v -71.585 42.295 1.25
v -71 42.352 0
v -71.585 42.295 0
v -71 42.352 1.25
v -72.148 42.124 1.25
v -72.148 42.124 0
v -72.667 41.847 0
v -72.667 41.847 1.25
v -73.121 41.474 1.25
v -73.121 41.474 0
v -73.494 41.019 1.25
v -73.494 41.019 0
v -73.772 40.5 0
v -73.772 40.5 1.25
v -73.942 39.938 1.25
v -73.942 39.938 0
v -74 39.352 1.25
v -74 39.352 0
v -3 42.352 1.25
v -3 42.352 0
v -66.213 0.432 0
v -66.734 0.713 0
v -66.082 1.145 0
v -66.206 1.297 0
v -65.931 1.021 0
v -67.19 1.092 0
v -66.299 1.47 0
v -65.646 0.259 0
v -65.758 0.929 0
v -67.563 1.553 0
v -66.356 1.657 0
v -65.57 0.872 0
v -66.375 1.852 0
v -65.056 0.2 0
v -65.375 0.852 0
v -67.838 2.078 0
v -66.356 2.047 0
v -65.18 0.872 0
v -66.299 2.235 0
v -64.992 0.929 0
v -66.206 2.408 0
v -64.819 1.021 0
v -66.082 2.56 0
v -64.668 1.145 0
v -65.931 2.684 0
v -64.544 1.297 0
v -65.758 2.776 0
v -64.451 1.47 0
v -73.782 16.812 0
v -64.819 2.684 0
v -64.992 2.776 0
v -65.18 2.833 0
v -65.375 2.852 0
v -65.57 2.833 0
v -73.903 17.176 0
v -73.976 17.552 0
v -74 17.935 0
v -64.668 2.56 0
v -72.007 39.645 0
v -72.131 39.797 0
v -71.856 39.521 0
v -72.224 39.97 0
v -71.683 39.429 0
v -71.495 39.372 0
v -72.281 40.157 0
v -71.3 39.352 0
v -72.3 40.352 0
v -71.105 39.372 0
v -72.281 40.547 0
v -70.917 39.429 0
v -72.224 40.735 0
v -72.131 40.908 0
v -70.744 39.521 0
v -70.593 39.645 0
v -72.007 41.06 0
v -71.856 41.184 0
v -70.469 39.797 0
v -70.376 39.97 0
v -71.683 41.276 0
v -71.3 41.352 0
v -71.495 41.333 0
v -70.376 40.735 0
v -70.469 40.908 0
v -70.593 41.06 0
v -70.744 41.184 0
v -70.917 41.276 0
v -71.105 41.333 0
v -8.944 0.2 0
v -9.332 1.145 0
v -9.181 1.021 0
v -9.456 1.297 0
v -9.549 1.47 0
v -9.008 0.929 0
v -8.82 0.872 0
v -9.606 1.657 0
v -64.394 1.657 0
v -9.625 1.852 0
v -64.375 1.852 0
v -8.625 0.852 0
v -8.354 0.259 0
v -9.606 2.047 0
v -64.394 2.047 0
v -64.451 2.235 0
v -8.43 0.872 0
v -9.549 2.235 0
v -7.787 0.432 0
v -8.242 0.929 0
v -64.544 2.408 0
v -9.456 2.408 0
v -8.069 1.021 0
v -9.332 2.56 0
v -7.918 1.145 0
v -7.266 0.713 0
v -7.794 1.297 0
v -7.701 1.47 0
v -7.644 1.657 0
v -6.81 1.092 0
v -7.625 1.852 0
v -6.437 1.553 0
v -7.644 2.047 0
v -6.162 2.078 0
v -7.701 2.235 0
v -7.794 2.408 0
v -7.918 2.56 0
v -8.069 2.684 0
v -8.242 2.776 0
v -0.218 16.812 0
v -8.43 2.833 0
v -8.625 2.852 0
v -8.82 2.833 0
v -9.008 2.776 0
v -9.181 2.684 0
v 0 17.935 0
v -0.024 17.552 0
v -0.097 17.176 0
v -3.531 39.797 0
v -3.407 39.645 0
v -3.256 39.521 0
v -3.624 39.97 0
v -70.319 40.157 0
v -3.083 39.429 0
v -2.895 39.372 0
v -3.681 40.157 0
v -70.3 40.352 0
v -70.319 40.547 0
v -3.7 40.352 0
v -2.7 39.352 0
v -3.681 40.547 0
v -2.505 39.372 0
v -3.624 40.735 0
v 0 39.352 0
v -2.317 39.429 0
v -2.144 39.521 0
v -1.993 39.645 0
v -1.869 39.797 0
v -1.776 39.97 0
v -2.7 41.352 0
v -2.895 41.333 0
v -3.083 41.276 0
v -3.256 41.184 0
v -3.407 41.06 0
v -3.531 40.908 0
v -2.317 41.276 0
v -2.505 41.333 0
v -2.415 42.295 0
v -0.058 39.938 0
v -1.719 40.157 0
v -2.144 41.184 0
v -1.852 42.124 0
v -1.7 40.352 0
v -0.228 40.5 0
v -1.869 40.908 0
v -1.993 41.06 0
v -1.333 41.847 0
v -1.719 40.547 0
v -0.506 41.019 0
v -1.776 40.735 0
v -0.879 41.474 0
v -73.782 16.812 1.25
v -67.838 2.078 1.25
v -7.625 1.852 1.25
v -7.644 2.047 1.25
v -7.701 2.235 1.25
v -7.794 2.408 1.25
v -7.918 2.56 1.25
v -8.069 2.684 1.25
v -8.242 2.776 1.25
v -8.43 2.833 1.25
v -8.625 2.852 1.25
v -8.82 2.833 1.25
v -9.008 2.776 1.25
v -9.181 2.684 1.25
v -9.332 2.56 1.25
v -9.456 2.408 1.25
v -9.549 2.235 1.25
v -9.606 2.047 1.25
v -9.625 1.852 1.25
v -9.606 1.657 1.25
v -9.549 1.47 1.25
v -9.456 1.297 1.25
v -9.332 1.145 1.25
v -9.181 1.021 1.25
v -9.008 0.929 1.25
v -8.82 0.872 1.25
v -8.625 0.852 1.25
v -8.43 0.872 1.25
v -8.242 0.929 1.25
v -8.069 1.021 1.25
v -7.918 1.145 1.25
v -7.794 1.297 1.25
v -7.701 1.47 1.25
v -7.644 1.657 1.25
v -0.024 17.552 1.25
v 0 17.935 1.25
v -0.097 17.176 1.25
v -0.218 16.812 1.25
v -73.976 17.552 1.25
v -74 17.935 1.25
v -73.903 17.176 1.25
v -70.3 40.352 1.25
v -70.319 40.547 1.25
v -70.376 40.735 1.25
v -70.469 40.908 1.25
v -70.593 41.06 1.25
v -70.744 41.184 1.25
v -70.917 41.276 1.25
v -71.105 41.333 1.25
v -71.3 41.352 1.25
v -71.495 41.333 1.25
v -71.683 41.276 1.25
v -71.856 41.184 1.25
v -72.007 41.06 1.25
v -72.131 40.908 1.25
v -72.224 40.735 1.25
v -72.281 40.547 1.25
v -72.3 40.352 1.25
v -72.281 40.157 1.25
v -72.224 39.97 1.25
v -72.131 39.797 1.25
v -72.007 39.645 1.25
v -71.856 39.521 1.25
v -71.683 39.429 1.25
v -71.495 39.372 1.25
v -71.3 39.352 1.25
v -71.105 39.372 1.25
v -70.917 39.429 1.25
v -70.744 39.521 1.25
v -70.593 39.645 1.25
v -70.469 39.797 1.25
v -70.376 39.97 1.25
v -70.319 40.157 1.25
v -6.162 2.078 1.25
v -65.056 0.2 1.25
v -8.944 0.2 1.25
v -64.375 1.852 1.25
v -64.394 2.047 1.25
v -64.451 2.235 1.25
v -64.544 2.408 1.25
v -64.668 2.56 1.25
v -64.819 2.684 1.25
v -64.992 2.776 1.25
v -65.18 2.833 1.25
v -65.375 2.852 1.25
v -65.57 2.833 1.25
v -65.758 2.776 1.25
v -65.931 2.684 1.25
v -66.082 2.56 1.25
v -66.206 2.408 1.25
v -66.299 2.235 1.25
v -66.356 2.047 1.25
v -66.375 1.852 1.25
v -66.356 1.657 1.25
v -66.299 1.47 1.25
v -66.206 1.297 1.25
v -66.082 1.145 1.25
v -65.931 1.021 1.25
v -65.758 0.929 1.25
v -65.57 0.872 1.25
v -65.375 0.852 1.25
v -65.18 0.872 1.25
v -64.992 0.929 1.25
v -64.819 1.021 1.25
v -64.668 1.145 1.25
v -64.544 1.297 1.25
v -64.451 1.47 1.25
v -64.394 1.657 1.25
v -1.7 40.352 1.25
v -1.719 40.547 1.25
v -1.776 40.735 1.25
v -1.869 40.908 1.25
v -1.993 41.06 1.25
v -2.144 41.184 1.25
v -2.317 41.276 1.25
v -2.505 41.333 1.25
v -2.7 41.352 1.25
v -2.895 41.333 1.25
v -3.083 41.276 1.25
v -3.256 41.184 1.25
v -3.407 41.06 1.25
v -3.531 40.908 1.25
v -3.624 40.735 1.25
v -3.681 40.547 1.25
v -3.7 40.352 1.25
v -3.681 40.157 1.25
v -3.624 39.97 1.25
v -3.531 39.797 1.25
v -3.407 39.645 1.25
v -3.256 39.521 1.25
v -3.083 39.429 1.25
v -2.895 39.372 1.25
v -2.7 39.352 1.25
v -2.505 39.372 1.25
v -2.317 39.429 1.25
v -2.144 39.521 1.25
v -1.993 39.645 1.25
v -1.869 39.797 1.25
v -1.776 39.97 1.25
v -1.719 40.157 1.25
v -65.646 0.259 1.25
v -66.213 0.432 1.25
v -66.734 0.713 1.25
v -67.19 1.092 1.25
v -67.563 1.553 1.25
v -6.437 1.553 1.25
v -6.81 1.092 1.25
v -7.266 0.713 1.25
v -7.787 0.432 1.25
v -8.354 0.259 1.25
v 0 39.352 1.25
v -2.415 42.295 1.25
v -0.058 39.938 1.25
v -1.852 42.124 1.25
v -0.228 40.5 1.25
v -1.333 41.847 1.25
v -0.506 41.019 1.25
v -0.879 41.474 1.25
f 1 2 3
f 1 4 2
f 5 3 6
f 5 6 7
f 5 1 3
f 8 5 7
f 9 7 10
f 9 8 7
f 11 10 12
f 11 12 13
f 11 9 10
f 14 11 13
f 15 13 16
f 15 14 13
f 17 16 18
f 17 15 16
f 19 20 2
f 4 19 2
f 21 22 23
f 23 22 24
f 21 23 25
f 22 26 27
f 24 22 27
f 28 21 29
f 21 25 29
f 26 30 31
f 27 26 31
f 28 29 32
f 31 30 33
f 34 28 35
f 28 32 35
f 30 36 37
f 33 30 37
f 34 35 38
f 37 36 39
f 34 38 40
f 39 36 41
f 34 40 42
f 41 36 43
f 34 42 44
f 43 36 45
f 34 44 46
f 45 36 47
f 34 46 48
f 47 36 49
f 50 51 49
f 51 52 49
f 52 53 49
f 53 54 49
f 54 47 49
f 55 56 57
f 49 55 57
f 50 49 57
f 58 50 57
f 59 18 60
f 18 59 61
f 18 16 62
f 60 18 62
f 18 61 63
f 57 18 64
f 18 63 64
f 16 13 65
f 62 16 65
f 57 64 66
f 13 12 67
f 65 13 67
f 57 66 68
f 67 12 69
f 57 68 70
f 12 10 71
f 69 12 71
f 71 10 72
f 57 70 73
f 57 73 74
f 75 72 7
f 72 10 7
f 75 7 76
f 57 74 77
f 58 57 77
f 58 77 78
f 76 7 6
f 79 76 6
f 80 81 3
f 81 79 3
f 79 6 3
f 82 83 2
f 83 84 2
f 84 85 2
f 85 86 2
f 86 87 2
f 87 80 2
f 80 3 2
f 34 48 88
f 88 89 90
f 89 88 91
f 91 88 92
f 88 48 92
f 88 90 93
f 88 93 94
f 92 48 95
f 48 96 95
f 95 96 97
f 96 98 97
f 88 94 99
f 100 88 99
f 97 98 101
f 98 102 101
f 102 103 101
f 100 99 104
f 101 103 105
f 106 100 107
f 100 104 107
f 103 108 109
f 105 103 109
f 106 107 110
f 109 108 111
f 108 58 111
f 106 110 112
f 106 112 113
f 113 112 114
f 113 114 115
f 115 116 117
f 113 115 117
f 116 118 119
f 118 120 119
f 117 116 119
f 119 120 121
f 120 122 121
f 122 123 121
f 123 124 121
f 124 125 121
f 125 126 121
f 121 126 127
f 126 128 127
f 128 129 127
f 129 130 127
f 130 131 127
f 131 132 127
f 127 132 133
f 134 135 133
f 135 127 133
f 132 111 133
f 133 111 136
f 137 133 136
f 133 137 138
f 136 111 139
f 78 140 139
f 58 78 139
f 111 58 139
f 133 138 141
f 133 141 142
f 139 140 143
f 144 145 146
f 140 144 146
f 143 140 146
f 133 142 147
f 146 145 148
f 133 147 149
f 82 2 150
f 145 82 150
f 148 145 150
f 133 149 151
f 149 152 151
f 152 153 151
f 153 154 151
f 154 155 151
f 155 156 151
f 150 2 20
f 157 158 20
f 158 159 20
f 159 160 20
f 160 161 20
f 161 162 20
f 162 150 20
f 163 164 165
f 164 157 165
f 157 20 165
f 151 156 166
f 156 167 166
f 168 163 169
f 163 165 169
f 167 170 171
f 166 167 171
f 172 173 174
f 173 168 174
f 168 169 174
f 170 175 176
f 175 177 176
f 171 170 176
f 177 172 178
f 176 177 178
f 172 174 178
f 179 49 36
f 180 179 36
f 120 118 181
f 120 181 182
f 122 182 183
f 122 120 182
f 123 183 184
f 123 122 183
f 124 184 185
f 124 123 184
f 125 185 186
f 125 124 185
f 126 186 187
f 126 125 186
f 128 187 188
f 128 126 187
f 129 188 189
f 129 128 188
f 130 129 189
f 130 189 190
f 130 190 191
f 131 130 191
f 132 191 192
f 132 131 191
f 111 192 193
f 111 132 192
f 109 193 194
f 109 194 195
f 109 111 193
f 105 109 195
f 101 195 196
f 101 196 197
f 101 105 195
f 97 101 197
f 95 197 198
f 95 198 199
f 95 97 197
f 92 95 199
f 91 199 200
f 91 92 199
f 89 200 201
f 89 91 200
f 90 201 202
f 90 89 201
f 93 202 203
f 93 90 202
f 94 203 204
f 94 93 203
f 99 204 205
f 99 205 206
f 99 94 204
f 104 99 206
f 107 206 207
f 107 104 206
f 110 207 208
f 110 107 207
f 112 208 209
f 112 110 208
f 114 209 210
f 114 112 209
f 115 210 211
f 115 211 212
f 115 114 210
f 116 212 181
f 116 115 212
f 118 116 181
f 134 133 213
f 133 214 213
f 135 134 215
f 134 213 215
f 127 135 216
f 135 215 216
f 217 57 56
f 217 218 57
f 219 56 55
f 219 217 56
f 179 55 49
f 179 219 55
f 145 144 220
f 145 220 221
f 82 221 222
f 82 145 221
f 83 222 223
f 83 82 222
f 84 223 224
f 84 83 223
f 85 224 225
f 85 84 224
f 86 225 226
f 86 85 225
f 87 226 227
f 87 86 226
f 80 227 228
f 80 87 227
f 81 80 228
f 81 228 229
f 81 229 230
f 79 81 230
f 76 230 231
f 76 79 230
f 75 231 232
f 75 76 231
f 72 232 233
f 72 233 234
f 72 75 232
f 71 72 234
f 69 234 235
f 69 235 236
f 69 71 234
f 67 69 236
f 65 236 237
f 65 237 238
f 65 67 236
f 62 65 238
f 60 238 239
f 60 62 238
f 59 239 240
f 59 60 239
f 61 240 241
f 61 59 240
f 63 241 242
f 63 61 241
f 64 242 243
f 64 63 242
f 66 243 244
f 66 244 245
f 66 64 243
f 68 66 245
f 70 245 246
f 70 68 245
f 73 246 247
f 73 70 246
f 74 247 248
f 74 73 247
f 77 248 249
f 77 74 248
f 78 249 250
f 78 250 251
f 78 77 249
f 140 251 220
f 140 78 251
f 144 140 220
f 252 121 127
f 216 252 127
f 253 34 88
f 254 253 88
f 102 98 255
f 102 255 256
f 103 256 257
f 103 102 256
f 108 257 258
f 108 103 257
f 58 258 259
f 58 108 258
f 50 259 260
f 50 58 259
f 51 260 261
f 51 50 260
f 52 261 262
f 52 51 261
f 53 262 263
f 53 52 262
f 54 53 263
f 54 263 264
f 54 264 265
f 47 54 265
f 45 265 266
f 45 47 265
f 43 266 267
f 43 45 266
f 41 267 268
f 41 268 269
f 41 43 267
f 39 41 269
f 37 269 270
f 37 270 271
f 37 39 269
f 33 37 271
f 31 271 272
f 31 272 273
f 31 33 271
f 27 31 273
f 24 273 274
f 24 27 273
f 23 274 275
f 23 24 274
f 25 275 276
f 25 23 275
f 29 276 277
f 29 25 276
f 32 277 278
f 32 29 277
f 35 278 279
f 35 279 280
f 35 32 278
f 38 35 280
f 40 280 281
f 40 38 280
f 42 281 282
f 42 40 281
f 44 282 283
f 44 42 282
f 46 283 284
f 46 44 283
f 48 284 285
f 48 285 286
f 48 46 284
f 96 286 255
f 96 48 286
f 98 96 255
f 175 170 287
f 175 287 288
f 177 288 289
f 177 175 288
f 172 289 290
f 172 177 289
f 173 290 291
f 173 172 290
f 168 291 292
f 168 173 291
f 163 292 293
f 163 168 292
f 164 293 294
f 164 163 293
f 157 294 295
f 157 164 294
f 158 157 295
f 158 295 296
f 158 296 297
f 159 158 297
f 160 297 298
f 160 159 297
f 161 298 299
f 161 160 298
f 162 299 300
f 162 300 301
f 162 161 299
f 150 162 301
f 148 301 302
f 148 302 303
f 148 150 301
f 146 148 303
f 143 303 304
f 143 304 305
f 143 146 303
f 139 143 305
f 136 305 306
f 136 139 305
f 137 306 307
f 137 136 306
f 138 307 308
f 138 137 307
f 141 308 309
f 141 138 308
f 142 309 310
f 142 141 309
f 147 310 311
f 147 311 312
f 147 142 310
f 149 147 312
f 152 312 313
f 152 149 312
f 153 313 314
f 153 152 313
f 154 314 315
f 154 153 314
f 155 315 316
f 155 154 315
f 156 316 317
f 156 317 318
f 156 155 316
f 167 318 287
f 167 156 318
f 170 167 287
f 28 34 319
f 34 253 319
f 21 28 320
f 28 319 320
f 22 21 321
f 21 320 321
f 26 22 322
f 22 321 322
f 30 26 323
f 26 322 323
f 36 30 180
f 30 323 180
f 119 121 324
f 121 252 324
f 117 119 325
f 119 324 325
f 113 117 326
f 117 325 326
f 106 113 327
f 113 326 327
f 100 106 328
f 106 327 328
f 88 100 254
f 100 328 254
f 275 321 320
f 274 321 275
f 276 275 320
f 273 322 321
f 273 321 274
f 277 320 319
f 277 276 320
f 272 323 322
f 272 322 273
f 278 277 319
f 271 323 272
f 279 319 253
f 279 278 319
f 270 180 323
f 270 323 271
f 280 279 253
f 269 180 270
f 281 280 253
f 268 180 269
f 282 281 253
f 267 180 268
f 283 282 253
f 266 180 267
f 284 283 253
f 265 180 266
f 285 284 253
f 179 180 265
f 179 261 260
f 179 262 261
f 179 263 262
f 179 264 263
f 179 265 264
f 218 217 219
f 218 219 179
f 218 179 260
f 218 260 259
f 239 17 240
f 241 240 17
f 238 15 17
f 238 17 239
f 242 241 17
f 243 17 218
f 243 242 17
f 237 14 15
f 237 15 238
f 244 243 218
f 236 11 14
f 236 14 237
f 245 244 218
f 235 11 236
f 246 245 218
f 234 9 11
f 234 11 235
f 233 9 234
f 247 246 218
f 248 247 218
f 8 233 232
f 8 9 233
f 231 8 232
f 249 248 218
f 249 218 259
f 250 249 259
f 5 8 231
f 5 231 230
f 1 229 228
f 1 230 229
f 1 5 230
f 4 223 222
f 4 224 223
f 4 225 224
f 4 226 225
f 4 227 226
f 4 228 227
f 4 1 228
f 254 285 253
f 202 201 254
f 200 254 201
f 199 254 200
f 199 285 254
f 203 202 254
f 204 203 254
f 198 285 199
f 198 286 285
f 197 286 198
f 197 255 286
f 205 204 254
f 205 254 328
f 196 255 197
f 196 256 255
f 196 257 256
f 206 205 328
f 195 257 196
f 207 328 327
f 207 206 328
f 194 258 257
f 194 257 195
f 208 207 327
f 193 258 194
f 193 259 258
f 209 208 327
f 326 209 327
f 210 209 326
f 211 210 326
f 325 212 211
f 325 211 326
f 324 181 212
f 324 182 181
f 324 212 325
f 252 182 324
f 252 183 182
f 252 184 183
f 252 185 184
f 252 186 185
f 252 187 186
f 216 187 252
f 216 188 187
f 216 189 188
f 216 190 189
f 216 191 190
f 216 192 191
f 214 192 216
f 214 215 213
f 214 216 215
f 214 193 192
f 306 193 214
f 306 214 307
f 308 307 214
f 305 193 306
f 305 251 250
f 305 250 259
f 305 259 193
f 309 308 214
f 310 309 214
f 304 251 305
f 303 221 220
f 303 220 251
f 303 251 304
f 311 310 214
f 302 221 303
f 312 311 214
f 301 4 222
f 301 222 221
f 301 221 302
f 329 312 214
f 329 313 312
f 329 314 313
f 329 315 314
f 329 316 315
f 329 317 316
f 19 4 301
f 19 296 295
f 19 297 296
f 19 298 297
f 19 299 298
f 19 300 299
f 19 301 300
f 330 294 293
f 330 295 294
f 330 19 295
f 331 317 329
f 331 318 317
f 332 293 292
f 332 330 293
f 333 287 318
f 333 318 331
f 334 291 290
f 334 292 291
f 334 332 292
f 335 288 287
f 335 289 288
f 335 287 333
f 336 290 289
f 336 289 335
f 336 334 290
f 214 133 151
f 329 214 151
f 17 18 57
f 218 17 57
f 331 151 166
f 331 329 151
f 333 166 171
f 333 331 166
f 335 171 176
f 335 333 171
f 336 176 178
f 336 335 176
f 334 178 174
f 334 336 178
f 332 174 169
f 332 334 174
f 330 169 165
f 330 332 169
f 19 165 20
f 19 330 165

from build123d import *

# Parameters (mm, degrees)
F0_R     = 1
F1_DEPTH = 1.25
F2_R     = 3


with BuildPart() as f1:
    # F0 (on Top) → F1 (new body)
    with BuildSketch(Plane.XY):
        Polygon((0, 17.3524001093), (0, 42.3524001093), (-74, 42.3524001093), (-74, 17.3524001093), (-67.080681713, 0.2000030523), (-6.919318287, 0.2000030523), align=None)
        with Locations((-65.375, 1.8524001093)):
            Circle(F0_R, mode=Mode.SUBTRACT)
        with Locations((-8.625, 1.8524001093)):
            Circle(F0_R, mode=Mode.SUBTRACT)
        with Locations((-71.3, 40.3524001093)):
            Circle(F0_R, mode=Mode.SUBTRACT)
        with Locations((-2.7, 40.3524001093)):
            Circle(F0_R, mode=Mode.SUBTRACT)
    extrude(amount=F1_DEPTH)

    # F2
    f2_edges = [f1.edges().sort_by_distance(p)[0] for p in [
        (0, 42.3524, 0.625),
        (-74, 42.3524, 0.625),
        (-74, 17.3524, 0.625),
        (0, 17.3524, 0.625),
        (-6.919318, 0.200003, 0.625),
        (-67.080682, 0.200003, 0.625),
    ]]
    fillet(f2_edges, radius=F2_R)


solid = f1.part
